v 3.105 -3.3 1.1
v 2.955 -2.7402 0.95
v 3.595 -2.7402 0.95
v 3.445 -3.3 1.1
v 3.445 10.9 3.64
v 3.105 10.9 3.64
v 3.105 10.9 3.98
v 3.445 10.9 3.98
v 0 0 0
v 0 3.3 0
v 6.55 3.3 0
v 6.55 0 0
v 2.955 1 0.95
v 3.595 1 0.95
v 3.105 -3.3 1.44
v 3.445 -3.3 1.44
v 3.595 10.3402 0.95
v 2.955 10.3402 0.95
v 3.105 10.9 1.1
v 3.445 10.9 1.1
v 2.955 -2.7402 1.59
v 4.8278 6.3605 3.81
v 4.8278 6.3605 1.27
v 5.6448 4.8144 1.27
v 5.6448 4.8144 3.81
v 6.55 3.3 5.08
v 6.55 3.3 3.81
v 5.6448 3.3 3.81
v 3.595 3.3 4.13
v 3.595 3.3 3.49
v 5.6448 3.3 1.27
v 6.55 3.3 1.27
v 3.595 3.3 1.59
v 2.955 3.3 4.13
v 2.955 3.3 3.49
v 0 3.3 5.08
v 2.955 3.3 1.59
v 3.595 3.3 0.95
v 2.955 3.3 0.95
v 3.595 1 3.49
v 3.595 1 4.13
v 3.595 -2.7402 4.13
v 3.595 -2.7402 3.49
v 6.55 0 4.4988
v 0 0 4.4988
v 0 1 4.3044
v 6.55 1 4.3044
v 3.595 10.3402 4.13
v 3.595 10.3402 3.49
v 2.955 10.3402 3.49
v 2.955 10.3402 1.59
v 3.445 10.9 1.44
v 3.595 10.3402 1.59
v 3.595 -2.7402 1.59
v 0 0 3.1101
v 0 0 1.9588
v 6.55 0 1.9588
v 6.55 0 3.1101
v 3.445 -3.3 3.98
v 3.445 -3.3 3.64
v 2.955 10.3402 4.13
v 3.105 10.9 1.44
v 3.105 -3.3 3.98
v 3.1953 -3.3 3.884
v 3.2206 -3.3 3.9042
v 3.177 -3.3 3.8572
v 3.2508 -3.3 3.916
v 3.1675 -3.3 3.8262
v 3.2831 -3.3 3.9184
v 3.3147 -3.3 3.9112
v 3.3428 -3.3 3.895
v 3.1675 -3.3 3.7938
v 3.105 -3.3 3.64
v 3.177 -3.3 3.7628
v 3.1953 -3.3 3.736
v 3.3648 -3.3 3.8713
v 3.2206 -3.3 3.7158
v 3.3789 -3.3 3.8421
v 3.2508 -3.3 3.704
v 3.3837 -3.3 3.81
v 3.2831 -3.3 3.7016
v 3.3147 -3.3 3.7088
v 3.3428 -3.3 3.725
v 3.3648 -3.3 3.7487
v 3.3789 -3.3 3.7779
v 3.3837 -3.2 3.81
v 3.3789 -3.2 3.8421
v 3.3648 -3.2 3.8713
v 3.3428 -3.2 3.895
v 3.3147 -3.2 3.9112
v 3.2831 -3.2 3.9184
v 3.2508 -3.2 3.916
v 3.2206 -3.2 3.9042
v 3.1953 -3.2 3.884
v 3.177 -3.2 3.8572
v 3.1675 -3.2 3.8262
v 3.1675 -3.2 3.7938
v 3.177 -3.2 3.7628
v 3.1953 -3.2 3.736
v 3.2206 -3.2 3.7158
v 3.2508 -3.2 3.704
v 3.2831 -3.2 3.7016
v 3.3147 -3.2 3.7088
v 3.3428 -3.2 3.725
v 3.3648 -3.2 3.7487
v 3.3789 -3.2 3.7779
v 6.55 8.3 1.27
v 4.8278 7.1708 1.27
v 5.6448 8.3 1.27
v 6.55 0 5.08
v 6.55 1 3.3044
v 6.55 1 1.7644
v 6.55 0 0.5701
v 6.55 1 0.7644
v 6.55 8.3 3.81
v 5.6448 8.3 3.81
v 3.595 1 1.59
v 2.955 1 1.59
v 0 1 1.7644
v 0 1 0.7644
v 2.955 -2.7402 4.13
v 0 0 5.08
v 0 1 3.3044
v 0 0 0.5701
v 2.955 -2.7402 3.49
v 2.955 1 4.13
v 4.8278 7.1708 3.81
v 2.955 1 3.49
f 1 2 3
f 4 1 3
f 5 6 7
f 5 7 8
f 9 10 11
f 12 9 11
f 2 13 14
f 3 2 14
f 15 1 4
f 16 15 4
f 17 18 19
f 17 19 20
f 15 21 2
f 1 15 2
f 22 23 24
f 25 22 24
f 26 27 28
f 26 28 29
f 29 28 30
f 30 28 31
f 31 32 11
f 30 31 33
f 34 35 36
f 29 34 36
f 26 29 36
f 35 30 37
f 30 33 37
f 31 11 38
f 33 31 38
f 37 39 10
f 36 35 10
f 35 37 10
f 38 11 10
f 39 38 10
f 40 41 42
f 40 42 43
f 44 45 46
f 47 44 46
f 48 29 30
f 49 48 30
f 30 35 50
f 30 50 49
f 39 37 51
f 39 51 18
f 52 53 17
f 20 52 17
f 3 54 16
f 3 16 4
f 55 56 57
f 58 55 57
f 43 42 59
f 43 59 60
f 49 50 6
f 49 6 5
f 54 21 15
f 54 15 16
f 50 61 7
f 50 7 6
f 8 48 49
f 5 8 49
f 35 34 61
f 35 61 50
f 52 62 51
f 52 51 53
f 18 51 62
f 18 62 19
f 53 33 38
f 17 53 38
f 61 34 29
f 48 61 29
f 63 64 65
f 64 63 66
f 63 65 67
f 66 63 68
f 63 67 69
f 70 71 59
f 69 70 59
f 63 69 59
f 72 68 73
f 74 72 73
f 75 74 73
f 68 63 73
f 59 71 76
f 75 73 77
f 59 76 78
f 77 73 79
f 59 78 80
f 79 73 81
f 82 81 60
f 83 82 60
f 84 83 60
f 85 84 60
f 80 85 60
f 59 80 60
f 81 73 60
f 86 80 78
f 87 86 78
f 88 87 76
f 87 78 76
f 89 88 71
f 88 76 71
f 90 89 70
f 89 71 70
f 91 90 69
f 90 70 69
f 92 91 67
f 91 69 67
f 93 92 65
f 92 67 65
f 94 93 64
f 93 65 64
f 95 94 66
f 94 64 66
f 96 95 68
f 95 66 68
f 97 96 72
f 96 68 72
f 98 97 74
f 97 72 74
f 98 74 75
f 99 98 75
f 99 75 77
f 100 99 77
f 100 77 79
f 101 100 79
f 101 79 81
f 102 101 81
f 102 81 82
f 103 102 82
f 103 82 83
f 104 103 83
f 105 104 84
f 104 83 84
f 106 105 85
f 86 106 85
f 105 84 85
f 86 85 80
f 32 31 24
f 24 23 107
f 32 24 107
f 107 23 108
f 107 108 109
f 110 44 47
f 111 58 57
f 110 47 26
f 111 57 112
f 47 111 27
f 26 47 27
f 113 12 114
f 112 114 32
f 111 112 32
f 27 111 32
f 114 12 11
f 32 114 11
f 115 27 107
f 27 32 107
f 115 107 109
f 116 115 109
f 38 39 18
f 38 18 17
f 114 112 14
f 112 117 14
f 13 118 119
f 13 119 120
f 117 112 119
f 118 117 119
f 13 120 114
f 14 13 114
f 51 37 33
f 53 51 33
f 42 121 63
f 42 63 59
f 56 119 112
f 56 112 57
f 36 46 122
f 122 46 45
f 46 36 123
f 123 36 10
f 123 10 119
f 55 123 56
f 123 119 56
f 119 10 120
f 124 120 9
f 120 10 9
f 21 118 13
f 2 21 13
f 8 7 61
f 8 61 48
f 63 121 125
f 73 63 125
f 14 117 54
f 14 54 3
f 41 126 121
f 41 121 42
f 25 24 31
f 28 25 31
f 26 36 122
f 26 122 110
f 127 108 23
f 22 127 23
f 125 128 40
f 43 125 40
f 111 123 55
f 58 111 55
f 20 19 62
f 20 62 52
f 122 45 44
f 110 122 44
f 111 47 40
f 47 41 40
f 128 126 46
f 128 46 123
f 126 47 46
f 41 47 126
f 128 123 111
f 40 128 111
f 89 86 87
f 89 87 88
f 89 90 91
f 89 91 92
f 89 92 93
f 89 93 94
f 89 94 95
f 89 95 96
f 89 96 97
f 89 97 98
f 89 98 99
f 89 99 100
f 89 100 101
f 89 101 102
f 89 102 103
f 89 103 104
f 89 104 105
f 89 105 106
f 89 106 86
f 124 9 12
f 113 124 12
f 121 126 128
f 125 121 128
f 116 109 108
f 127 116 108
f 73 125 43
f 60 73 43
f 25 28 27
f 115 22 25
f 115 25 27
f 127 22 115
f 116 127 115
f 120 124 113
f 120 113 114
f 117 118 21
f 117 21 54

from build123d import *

# Parameters (mm, degrees)
SALIENTE_EXTRUIR1_DEPTH      = 5.08
CROQUIS2_W                   = 1.27
CROQUIS2_H                   = 5
CORTAR_EXTRUIR1_DEPTH        = 5.08
CORTAR_EXTRUIR1_DEPTH_BACK   = 5.08
CROQUIS4_W                   = 0.64
CROQUIS4_H                   = 0.64
CORTAR_EXTRUIR2_DEPTH        = 5.08
CORTAR_EXTRUIR3_DEPTH        = 15.08
CROQUIS6_W                   = 0.64
CROQUIS6_H                   = 0.64
SALIENTE_EXTRUIR2_DEPTH      = 7.6
SALIENTE_EXTRUIR2_DEPTH_BACK = 6.6
CHAFL_N1_SIZE                = 0.15
CHAFL_N1_SIZE2               = 0.559807621
CHAFL_N1_PART_2_SIZE         = 0.15
CHAFL_N1_PART_2_SIZE2        = 0.559807621
CHAFL_N2_SIZE                = 0.15
CHAFL_N2_SIZE2               = 0.559807621
CHAFL_N2_PART_2_SIZE         = 0.15
CHAFL_N2_PART_2_SIZE2        = 0.559807621
CROQUIS7_R                   = 0.108736381
CORTAR_EXTRUIR4_DEPTH        = 0.1


with BuildPart() as part:
    # Croquis1 → Saliente-Extruir1 (new body)
    with BuildSketch(Plane.XY):
        Polygon((0, 0), (6.55, 0), (6.55, 8.3), (5.64478846, 8.3), (4.827789026, 7.170813791), (4.827789026, 6.360456628), (5.64478846, 4.814385239), (5.64478846, 3.3), (0, 3.3), align=None)
    extrude(amount=SALIENTE_EXTRUIR1_DEPTH)

    # Croquis2 → Cortar-Extruir1 (cut, two sides)
    with BuildSketch(Plane.ZY.offset(-5.64478846)) as cortar_extruir1_sk:
        with Locations((0.635, 5.8)):
            Rectangle(CROQUIS2_W, CROQUIS2_H)
        with Locations((4.445, 5.8)):
            Rectangle(CROQUIS2_W, CROQUIS2_H)
    extrude(amount=CORTAR_EXTRUIR1_DEPTH, mode=Mode.SUBTRACT)
    extrude(cortar_extruir1_sk.sketch, amount=-CORTAR_EXTRUIR1_DEPTH_BACK, mode=Mode.SUBTRACT)

    # Croquis4 → Cortar-Extruir2 (cut)
    with BuildSketch(Plane(origin=(0, 3.3, 0), x_dir=(1, 0, 0), z_dir=(0, 1, 0))):
        with Locations((3.275, -1.27)):
            Rectangle(CROQUIS4_W, CROQUIS4_H)
        with Locations((3.275, -3.81)):
            Rectangle(CROQUIS4_W, CROQUIS4_H)
    extrude(amount=-CORTAR_EXTRUIR2_DEPTH, mode=Mode.SUBTRACT)

    # Croquis5 → Cortar-Extruir3 (cut)
    with BuildSketch(Plane.ZY):
        Polygon((1.264438254, 1), (1.764438254, 1), (1.958818564, 0), (0.570057945, 0), (0.764438254, 1), align=None)
        Polygon((3.304438254, 1), (3.110057945, 0), (4.498818564, 0), (4.304438254, 1), (3.804438254, 1), align=None)
    extrude(amount=-CORTAR_EXTRUIR3_DEPTH, mode=Mode.SUBTRACT)

    # Croquis6 → Saliente-Extruir2 (add, two sides)
    with BuildSketch(Plane(origin=(0, 3.3, 0), x_dir=(1, 0, 0), z_dir=(0, 1, 0))) as saliente_extruir2_sk:
        with Locations((3.275, -1.27)):
            Rectangle(CROQUIS6_W, CROQUIS6_H)
        with Locations((3.275, -3.81)):
            Rectangle(CROQUIS6_W, CROQUIS6_H)
    extrude(amount=SALIENTE_EXTRUIR2_DEPTH)
    extrude(saliente_extruir2_sk.sketch, amount=-SALIENTE_EXTRUIR2_DEPTH_BACK)

    # Chaflán1
    chafl_n1_edges = [part.edges().sort_by_distance(p)[0] for p in [
        (3.595, 10.9, 1.27),
        (3.275, 10.9, 0.95),
        (2.955, 10.9, 1.27),
        (3.275, 10.9, 1.59),
    ]]
    chafl_n1_side = [part.faces().sort_by_distance(p)[0] for p in [
        (3.275, 10.9, 1.27),
    ]]
    chamfer(chafl_n1_edges, length=CHAFL_N1_SIZE, length2=CHAFL_N1_SIZE2, reference=chafl_n1_side[0])

    # Chaflán1 part 2
    chafl_n1_part_2_edges = [part.edges().sort_by_distance(p)[0] for p in [
        (3.595, 10.9, 3.81),
        (3.275, 10.9, 3.49),
        (2.955, 10.9, 3.81),
        (3.275, 10.9, 4.13),
    ]]
    chafl_n1_part_2_side = [part.faces().sort_by_distance(p)[0] for p in [
        (3.275, 10.9, 3.81),
    ]]
    chamfer(chafl_n1_part_2_edges, length=CHAFL_N1_PART_2_SIZE, length2=CHAFL_N1_PART_2_SIZE2, reference=chafl_n1_part_2_side[0])

    # Chaflán2
    chafl_n2_edges = [part.edges().sort_by_distance(p)[0] for p in [
        (3.595, -3.3, 1.27),
        (3.275, -3.3, 1.59),
        (2.955, -3.3, 1.27),
        (3.275, -3.3, 0.95),
    ]]
    chafl_n2_side = [part.faces().sort_by_distance(p)[0] for p in [
        (3.275, -3.3, 1.27),
    ]]
    chamfer(chafl_n2_edges, length=CHAFL_N2_SIZE, length2=CHAFL_N2_SIZE2, reference=chafl_n2_side[0])

    # Chaflán2 part 2
    chafl_n2_part_2_edges = [part.edges().sort_by_distance(p)[0] for p in [
        (3.595, -3.3, 3.81),
        (3.275, -3.3, 4.13),
        (2.955, -3.3, 3.81),
        (3.275, -3.3, 3.49),
    ]]
    chafl_n2_part_2_side = [part.faces().sort_by_distance(p)[0] for p in [
        (3.275, -3.3, 3.81),
    ]]
    chamfer(chafl_n2_part_2_edges, length=CHAFL_N2_PART_2_SIZE, length2=CHAFL_N2_PART_2_SIZE2, reference=chafl_n2_part_2_side[0])

    # Croquis7 → Cortar-Extruir4 (cut)
    with BuildSketch(Plane.XZ.offset(3.3)):
        with Locations((3.275, 3.81)):
            Circle(CROQUIS7_R)
    extrude(amount=-CORTAR_EXTRUIR4_DEPTH, mode=Mode.SUBTRACT)


solid = part.part
